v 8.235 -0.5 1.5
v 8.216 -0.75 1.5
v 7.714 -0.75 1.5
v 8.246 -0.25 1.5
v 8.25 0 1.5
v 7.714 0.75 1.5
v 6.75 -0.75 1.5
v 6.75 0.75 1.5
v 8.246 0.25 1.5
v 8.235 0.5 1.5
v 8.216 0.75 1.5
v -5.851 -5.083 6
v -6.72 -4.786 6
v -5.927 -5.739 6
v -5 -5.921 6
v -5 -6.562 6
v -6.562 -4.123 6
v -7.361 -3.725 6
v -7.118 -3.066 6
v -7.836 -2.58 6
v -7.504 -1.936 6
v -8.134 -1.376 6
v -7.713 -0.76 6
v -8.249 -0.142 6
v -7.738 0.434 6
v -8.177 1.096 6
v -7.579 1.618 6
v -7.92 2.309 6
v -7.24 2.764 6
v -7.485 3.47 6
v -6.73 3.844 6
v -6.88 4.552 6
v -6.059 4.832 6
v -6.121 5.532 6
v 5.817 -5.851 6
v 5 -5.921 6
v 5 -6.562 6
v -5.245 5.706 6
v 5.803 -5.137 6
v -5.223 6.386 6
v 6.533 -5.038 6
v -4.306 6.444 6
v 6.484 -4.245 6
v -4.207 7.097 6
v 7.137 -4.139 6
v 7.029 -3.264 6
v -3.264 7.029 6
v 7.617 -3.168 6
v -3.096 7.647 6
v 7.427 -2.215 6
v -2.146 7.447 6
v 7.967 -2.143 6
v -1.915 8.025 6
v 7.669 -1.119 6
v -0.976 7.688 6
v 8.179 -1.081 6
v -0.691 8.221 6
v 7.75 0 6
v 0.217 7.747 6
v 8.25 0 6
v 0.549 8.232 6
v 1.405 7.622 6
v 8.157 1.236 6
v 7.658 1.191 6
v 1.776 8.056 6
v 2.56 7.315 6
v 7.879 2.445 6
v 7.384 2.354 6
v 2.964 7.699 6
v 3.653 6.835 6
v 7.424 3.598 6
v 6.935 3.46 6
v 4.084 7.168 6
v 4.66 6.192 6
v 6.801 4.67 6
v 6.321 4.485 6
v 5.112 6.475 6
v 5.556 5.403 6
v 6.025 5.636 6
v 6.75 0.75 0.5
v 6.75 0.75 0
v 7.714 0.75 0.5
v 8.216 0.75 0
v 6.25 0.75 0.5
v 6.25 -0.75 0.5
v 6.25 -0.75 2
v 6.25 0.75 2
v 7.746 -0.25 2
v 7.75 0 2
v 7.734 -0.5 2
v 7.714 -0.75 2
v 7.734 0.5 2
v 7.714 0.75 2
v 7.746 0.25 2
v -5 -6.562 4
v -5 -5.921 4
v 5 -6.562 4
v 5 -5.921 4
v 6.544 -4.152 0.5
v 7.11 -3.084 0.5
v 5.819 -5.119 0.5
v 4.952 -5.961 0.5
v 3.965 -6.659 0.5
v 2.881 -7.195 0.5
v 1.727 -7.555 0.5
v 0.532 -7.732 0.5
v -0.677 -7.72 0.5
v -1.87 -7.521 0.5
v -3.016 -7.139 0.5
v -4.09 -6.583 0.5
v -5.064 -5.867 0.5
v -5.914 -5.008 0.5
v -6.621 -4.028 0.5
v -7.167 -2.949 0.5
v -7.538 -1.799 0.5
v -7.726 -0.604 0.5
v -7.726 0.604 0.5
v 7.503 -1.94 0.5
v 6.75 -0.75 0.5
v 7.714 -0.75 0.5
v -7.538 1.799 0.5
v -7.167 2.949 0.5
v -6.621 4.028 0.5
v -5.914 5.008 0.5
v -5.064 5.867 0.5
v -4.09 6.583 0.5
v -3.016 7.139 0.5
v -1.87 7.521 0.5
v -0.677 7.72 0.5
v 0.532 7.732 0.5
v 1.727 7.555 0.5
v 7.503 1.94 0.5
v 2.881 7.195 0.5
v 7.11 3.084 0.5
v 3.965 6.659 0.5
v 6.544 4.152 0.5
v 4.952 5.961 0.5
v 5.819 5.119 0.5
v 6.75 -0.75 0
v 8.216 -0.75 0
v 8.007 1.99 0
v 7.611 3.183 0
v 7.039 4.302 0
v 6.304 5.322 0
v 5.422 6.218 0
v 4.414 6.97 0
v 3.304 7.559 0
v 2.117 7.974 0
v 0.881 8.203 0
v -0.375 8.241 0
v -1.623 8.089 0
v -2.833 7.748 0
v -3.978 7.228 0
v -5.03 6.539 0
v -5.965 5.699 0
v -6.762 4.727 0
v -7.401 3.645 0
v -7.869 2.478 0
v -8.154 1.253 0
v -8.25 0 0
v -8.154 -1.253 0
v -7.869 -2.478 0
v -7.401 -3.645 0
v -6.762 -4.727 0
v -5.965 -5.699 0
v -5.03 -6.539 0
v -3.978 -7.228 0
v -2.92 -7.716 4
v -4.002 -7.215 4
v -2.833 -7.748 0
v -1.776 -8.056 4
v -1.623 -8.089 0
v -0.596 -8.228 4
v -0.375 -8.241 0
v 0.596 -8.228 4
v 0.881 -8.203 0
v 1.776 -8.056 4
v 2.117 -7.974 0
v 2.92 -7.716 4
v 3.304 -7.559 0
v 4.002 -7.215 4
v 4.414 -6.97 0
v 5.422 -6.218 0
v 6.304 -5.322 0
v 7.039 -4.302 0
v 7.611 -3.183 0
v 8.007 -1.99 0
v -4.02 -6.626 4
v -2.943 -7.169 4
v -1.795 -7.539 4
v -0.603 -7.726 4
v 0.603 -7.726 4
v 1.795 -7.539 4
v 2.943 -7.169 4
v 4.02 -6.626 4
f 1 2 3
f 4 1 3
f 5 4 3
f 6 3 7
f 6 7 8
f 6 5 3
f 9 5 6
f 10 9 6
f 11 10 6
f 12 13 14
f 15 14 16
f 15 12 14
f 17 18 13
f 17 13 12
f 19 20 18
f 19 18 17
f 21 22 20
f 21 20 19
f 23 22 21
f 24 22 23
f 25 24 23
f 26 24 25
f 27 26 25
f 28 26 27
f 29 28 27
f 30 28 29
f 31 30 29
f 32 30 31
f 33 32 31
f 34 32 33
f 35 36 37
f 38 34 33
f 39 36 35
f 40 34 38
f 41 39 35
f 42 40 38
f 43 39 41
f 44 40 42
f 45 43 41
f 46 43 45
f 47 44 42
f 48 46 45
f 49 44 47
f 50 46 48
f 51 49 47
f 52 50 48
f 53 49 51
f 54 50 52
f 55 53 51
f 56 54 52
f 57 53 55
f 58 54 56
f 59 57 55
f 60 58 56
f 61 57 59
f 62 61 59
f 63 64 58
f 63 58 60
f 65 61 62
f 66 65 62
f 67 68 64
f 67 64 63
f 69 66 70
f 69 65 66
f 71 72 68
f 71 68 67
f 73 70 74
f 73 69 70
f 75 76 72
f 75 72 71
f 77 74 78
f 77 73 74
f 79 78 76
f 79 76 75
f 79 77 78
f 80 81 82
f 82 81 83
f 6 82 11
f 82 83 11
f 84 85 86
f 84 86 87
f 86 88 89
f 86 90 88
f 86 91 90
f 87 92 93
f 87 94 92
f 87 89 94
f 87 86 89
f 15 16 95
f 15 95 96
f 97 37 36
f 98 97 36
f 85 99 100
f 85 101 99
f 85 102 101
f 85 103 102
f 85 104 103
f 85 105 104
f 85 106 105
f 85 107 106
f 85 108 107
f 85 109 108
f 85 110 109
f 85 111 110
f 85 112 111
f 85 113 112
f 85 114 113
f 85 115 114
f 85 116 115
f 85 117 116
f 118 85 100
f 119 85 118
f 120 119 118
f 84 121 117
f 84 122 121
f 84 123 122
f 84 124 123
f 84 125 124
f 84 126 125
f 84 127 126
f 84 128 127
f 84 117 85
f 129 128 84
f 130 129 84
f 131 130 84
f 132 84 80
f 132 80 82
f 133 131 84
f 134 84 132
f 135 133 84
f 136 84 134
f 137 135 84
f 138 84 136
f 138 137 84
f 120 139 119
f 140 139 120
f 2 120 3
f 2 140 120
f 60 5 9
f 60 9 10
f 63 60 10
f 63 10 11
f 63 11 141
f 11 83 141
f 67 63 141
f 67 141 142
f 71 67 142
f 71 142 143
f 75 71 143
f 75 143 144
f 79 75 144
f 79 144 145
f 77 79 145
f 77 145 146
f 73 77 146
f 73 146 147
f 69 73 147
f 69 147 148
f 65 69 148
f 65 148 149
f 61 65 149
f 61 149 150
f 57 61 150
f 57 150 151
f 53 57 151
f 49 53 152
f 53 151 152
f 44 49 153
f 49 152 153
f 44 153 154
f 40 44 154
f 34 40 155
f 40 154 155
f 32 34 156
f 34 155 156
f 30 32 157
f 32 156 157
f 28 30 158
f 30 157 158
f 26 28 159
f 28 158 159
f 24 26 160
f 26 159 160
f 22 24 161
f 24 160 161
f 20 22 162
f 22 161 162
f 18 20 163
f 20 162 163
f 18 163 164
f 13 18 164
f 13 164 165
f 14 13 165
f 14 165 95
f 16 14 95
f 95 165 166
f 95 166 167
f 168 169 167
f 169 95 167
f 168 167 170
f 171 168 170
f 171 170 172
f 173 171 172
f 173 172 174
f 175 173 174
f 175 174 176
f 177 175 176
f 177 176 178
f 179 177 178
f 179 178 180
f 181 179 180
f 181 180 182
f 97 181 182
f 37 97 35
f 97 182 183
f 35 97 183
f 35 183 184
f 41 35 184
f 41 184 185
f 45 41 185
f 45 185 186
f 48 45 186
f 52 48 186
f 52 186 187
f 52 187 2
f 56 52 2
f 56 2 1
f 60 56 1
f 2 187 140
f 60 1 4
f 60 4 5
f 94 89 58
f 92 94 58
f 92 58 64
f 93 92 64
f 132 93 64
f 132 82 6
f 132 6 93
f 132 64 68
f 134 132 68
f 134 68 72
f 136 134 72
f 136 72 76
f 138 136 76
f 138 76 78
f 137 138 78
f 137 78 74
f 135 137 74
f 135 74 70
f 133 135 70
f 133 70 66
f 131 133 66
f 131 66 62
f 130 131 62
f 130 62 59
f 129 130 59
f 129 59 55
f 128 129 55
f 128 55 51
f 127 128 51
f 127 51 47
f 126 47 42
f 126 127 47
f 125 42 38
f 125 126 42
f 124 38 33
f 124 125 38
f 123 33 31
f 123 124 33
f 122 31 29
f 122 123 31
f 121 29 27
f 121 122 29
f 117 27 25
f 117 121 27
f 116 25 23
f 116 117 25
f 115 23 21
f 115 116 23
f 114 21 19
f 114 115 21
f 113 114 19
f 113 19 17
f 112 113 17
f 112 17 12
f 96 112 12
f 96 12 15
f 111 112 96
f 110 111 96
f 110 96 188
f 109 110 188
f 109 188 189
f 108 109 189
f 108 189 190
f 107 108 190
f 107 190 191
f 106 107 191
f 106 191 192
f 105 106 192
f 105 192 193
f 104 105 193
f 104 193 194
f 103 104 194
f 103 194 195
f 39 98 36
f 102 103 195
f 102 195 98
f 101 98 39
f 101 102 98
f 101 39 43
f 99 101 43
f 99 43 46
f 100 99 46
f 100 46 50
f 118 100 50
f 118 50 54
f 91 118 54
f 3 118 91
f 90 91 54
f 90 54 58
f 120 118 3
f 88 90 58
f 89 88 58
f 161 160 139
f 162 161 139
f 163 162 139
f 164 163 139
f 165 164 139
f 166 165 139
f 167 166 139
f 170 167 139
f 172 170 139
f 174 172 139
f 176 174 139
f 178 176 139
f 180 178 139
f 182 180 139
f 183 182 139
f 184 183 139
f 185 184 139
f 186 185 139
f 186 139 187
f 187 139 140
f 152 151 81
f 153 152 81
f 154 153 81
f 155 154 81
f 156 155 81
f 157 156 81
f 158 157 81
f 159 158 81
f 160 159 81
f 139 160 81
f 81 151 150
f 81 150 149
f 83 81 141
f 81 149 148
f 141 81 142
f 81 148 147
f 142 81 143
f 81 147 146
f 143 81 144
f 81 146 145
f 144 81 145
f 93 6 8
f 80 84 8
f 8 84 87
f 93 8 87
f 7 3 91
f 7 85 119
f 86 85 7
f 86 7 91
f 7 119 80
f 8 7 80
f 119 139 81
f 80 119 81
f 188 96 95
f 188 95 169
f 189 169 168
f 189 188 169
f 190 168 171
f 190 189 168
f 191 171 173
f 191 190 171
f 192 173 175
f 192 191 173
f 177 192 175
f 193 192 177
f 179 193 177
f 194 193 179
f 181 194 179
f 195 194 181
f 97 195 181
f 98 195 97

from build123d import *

# Parameters (mm, degrees)
SKETCH003_R     = 8.25
PAD_DEPTH       = 6
THICKNESS_T     = -0.5
SKETCH004_W     = 10
SKETCH004_H     = 9.446465
POCKET_DEPTH    = 2
SKETCH005_W     = 1.5
SKETCH005_H     = 1.5
POCKET001_DEPTH = 1.5
SKETCH006_W     = 0.5
SKETCH006_H     = 1.5
PAD001_DEPTH    = 1.5
SKETCH007_W     = 1.5
SKETCH007_H     = 0.5
PAD002_DEPTH    = 1.75


with BuildPart() as part:
    # Sketch003 → Pad (new body)
    with BuildSketch(Plane.XY):
        Circle(SKETCH003_R)
    extrude(amount=PAD_DEPTH)

    # Thickness
    thickness_openings = [part.faces().sort_by_distance(p)[0] for p in [
        (0, 0, 6),
    ]]
    offset(amount=THICKNESS_T, openings=thickness_openings)

    # Sketch004 (on DatumPlane) → Pocket (cut)
    with BuildSketch(Plane.XY.offset(6)):
        with Locations((0, -4.723232)):
            Rectangle(SKETCH004_W, SKETCH004_H)
    extrude(amount=-POCKET_DEPTH, mode=Mode.SUBTRACT)

    # Sketch005 (on DatumPlane) → Pocket001 (cut)
    with BuildSketch(Plane.YZ.offset(8.25)):
        with Locations((0, 0.75)):
            Rectangle(SKETCH005_W, SKETCH005_H)
    extrude(amount=-POCKET001_DEPTH, mode=Mode.SUBTRACT)

    # Sketch006 (on DatumPlane) → Pad001 (join)
    with BuildSketch(Plane.XY.offset(0.5)):
        with Locations((6.5, 0)):
            Rectangle(SKETCH006_W, SKETCH006_H)
    extrude(amount=PAD001_DEPTH)

    # Sketch007 (on DatumPlane) → Pad002 (join)
    with BuildSketch(Plane.YZ.offset(6.25)):
        with Locations((0, 1.75)):
            Rectangle(SKETCH007_W, SKETCH007_H)
    extrude(amount=PAD002_DEPTH)


solid = part.part
